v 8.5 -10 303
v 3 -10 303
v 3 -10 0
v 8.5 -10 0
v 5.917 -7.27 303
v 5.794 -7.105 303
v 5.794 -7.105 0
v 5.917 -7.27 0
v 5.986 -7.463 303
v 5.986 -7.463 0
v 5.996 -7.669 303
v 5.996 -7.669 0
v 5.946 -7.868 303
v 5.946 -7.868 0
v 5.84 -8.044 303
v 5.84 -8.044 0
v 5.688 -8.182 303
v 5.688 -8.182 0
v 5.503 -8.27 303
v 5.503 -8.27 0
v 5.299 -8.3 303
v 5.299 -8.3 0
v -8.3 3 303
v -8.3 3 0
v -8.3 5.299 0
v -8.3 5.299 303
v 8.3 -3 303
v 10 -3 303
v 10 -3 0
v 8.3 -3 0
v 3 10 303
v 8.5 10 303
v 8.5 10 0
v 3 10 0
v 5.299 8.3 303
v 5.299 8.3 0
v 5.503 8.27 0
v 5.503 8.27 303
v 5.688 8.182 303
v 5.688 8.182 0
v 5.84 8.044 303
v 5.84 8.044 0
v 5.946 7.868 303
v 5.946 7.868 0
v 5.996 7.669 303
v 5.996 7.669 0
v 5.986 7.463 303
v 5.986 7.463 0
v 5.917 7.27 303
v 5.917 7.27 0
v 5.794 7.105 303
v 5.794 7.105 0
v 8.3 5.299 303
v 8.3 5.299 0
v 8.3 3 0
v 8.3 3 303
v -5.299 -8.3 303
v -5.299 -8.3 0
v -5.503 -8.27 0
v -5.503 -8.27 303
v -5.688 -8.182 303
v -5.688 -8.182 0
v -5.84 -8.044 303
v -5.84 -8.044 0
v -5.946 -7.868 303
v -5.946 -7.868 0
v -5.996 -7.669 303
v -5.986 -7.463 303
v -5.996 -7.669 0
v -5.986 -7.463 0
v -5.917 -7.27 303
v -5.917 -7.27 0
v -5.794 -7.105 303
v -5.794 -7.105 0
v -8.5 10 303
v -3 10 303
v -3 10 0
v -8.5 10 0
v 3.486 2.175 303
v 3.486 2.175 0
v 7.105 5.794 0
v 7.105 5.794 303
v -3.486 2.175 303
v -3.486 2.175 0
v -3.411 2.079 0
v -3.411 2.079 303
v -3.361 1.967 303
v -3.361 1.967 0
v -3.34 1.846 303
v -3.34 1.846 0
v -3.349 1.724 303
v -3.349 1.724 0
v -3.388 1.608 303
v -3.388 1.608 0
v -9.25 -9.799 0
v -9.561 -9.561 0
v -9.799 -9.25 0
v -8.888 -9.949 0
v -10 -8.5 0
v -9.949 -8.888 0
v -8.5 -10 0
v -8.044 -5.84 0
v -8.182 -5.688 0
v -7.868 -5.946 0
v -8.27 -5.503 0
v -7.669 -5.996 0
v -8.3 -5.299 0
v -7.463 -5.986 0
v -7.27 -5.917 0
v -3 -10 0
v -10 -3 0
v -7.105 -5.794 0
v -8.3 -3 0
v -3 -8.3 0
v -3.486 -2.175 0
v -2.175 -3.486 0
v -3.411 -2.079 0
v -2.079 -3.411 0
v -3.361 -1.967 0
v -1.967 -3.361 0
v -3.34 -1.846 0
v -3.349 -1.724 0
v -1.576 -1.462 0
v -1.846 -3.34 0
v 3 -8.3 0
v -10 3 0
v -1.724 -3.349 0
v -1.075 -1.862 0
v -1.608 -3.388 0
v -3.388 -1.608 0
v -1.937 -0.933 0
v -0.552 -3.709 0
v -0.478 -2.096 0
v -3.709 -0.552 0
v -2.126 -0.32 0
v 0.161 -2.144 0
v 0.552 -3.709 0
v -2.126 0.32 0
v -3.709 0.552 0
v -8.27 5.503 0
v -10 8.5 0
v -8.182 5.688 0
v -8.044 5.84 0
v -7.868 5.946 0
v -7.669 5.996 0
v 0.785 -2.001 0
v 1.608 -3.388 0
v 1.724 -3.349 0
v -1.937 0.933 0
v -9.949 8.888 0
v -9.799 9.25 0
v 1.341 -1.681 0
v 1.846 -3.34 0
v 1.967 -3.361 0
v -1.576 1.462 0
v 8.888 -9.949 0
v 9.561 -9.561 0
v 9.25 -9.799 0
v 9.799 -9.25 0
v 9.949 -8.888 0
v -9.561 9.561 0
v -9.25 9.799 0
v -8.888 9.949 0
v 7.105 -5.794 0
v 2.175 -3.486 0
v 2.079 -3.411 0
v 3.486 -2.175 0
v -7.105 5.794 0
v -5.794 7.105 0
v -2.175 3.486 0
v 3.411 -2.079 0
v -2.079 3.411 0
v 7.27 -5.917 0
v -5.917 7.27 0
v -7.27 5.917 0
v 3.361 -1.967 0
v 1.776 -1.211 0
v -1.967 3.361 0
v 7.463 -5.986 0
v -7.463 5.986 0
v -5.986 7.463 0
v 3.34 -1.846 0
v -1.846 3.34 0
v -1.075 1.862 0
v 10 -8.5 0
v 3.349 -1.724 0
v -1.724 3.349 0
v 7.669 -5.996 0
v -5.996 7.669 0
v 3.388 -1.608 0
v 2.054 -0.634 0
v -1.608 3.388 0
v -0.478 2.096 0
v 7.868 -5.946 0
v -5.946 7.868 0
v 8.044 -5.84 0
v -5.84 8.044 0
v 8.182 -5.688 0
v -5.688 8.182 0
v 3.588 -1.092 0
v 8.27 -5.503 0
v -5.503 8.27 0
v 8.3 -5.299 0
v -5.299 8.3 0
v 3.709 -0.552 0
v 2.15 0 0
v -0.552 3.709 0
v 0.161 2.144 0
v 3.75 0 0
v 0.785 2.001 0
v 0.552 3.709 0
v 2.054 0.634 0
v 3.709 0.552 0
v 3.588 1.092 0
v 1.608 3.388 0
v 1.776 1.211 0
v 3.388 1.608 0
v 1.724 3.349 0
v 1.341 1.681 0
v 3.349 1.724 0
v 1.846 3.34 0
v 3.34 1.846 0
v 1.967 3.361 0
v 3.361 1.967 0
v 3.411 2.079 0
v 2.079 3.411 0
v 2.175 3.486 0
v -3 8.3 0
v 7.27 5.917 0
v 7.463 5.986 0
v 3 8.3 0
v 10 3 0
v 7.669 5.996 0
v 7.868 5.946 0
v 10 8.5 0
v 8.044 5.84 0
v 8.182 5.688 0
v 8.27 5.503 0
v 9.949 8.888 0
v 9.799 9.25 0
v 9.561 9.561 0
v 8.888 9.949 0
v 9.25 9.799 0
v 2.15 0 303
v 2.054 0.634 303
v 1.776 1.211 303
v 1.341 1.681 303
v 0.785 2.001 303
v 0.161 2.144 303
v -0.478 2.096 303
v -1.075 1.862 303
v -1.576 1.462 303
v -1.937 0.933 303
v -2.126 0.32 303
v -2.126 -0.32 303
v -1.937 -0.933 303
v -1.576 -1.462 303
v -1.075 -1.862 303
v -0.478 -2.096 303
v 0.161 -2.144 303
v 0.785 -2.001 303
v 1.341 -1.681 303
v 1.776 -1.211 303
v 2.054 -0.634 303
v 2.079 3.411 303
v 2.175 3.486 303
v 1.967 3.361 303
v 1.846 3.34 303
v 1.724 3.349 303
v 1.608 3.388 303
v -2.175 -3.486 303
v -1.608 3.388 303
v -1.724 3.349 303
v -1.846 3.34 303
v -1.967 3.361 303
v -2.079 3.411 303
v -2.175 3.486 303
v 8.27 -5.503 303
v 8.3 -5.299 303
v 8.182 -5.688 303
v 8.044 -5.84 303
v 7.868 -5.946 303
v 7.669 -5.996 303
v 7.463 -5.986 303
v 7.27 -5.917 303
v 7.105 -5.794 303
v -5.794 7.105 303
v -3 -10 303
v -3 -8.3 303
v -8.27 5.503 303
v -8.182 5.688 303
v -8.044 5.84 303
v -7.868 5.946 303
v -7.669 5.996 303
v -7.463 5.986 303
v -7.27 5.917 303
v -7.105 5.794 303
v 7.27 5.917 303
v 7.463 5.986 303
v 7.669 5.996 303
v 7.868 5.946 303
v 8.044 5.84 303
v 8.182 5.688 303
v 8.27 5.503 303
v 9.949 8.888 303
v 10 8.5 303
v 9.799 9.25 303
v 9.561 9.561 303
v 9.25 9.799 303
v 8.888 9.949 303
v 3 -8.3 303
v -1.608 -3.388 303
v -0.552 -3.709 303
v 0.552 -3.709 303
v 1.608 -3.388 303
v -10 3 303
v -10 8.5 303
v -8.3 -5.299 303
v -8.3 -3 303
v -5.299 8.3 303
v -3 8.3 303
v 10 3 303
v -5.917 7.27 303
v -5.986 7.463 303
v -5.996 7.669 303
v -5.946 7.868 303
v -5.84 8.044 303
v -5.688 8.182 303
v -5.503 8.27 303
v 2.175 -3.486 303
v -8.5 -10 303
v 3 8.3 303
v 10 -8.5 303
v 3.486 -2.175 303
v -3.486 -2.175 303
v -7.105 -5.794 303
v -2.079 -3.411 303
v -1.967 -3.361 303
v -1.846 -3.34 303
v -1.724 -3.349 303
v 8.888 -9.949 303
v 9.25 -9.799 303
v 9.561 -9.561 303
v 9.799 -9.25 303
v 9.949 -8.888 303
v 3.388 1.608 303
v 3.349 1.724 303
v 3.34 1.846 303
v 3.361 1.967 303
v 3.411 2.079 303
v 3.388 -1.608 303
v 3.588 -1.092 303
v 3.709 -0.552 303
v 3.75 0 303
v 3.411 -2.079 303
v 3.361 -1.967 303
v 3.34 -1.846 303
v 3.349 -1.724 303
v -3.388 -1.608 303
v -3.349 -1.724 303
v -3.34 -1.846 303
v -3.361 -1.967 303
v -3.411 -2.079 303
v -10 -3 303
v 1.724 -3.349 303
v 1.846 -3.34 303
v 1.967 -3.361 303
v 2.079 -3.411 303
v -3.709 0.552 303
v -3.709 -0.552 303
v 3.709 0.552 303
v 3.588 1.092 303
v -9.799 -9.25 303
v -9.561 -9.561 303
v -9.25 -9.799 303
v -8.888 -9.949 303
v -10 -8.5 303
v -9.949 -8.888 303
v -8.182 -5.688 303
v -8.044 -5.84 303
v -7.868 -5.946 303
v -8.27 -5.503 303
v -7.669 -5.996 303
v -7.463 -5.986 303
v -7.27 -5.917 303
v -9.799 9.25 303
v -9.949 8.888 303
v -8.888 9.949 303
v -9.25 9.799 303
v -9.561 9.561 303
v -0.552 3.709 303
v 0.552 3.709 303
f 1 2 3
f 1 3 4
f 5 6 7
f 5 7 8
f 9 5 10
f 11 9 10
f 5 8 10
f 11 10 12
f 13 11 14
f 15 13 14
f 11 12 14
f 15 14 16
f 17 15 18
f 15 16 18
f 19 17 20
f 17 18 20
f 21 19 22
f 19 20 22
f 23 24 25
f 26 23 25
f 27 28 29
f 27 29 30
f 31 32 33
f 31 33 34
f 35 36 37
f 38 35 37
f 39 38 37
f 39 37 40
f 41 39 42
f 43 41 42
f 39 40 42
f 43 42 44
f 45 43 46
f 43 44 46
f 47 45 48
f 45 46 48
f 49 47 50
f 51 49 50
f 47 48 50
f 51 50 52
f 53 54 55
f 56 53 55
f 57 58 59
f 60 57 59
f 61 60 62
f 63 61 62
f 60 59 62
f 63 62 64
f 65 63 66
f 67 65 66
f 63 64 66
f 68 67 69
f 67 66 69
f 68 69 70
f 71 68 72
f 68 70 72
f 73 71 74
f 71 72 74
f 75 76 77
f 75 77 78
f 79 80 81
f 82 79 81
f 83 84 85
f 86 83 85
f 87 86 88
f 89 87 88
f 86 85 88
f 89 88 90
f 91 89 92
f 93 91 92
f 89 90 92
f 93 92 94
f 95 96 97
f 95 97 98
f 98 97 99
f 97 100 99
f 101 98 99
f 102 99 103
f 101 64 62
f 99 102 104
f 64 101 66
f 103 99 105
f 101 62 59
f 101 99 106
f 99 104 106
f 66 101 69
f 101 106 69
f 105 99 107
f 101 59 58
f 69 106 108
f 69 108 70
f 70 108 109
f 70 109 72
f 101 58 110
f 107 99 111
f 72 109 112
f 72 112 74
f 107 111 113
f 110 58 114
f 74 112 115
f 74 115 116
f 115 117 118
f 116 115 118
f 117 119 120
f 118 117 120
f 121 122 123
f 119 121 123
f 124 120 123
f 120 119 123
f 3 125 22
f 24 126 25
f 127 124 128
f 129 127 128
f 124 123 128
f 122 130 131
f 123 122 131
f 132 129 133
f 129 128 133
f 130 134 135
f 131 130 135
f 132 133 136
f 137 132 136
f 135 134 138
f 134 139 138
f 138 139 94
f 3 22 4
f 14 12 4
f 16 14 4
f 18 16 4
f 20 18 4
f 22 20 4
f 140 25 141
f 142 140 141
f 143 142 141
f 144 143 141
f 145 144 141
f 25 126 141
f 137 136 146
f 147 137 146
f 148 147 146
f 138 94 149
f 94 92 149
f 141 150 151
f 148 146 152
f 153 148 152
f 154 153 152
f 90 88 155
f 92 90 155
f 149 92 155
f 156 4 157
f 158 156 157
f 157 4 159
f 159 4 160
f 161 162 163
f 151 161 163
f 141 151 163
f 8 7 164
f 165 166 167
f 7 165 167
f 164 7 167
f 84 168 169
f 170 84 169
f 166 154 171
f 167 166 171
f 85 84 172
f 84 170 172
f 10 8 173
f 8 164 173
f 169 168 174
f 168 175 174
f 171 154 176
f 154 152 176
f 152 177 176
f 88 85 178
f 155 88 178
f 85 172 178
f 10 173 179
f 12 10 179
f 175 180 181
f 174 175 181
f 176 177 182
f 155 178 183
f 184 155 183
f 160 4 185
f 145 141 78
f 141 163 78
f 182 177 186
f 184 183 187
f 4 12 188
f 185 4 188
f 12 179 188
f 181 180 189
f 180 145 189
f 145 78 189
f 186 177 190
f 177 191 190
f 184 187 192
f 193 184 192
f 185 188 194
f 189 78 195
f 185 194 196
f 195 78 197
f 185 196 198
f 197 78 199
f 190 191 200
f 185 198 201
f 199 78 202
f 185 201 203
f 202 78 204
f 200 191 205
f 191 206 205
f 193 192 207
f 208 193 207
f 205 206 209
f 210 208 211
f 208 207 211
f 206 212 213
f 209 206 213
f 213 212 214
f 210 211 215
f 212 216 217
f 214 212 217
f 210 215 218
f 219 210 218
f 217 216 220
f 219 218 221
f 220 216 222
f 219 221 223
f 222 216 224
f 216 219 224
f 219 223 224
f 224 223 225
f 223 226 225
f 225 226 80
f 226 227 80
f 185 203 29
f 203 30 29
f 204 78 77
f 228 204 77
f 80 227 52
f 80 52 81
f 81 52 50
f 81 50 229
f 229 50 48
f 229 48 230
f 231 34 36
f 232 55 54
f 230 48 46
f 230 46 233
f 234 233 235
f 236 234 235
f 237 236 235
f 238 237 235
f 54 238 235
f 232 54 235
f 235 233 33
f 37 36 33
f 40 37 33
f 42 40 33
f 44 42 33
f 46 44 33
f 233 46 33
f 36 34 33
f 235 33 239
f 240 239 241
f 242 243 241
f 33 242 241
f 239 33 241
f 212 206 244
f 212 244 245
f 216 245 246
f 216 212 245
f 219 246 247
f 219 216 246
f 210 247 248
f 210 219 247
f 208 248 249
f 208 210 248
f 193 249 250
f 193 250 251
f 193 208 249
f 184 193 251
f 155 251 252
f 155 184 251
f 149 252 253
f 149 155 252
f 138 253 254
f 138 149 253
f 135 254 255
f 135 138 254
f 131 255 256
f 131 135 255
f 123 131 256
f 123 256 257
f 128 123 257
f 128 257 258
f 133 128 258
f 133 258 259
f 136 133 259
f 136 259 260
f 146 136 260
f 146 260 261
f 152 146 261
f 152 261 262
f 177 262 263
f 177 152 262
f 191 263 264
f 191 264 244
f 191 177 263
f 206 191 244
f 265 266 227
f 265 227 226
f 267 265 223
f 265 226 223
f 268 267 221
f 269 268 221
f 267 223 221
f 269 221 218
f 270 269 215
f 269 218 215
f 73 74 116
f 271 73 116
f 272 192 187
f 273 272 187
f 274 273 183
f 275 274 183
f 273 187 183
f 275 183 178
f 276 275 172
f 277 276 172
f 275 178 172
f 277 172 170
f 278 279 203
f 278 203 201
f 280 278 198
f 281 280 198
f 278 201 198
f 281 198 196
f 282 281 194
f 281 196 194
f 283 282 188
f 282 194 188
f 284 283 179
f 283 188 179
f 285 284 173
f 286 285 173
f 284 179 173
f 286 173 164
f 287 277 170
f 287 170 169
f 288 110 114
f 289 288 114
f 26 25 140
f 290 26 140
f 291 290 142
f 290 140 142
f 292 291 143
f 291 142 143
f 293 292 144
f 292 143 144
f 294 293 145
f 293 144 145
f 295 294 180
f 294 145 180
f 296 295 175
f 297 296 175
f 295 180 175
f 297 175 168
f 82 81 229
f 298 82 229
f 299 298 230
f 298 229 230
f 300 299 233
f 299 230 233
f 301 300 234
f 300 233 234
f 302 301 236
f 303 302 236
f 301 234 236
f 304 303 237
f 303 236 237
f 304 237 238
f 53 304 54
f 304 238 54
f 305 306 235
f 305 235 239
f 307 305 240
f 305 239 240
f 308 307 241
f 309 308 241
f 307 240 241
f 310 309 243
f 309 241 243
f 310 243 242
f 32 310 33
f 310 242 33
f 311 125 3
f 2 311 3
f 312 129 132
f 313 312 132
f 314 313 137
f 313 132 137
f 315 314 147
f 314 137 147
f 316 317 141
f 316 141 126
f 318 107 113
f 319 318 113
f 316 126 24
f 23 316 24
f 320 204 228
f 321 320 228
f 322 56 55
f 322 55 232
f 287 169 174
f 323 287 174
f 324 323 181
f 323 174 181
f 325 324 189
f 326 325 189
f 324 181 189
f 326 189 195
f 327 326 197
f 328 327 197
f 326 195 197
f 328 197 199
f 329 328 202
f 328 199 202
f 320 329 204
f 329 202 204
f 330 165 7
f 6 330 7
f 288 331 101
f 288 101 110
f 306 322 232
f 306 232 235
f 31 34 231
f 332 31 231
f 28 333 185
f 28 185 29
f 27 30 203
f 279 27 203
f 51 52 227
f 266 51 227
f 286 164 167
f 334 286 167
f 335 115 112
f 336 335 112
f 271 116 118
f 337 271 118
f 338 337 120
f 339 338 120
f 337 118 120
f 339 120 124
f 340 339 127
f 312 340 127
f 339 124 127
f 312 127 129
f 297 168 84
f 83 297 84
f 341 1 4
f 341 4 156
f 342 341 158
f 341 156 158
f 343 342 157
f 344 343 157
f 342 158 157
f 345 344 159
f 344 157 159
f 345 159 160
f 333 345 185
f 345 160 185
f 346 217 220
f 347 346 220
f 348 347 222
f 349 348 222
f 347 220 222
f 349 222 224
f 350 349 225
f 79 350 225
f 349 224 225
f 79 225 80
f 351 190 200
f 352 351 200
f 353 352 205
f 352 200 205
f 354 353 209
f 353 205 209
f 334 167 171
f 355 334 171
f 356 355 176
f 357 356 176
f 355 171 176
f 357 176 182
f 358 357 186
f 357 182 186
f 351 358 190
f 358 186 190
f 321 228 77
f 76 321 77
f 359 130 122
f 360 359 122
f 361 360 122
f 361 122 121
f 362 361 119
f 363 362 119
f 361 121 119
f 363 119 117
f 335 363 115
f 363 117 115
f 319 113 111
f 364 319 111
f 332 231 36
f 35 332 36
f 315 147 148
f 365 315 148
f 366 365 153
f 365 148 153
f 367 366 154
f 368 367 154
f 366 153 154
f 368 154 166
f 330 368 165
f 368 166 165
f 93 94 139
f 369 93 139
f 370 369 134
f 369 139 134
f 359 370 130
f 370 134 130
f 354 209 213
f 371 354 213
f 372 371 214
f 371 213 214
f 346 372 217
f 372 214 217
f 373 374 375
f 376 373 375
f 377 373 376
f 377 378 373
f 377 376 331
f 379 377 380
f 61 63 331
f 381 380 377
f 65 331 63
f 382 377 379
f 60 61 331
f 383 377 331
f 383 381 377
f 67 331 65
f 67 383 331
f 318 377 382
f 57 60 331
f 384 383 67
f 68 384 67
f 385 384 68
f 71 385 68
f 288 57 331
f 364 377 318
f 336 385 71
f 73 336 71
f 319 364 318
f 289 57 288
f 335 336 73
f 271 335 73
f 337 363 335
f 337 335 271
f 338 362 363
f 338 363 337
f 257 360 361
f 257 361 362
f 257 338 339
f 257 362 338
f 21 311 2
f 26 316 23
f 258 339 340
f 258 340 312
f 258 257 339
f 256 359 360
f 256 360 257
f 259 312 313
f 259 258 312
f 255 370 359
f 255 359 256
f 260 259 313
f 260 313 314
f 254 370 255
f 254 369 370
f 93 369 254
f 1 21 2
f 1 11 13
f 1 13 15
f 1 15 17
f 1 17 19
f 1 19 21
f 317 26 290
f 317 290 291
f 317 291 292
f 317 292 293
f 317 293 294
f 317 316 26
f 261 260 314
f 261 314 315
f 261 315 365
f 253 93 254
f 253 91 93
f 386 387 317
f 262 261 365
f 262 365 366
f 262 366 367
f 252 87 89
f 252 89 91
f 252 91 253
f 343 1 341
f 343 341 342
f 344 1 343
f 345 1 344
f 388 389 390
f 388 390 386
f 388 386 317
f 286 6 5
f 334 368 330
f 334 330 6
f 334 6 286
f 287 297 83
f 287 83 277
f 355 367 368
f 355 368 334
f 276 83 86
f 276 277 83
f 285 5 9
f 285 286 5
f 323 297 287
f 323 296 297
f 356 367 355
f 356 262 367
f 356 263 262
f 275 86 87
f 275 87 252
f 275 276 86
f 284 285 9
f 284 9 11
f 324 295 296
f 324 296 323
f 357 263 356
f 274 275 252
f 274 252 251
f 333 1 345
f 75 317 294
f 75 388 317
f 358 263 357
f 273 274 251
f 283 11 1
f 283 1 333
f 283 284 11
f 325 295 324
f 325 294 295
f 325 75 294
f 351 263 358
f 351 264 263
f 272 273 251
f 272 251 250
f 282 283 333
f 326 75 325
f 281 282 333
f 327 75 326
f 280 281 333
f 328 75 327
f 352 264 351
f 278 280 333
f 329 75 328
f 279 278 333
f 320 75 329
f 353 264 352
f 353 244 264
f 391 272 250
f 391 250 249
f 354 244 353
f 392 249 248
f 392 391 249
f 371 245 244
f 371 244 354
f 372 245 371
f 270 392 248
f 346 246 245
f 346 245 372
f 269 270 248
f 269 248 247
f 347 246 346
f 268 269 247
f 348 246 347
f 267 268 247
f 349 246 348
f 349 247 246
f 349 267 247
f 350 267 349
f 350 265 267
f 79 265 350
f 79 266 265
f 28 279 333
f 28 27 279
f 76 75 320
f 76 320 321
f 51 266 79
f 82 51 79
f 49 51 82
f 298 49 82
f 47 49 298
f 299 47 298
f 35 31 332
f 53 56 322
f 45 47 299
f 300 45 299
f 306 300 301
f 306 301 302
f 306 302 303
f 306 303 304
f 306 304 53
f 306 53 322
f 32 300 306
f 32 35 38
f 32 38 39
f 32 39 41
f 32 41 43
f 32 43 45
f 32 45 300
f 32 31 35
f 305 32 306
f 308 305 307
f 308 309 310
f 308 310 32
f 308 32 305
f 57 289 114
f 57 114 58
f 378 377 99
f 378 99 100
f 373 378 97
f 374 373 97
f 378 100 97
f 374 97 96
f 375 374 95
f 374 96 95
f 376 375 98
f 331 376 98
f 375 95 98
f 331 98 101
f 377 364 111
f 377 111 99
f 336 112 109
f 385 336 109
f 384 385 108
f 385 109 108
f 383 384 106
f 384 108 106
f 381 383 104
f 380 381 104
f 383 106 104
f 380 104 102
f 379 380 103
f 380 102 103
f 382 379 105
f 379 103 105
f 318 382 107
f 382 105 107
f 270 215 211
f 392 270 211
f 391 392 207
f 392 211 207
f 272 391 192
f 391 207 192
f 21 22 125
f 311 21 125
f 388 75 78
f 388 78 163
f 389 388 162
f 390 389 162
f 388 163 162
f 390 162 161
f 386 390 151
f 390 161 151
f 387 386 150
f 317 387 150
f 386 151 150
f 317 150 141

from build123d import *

# Parameters (mm, degrees)
ESQUISSE1_R        = 2.15
BOSS_EXTRU_1_DEPTH = 303


with BuildPart() as part:
    # Esquisse1 → Boss.-Extru.1 (new body)
    with BuildSketch(Plane.XY):
        with BuildLine():
            Line((-3, 10), (-8.5, 10))
            ThreePointArc((-8.5, 10), (-9.560660172, 9.560660172), (-10, 8.5))
            Line((-10, 8.5), (-10, 3))
            Line((-10, 3), (-8.300000103, 3))
            Line((-8.300000103, 3), (-8.300000103, 5.299391013))
            ThreePointArc((-8.300000103, 5.299391013), (-7.867878523, 5.946106661), (-7.105025403, 5.794365741))
            Line((-7.105025403, 5.794365741), (-3.486125569, 2.175465907))
            ThreePointArc((-3.486125569, 2.175465907), (-3.346986783, 1.907085393), (-3.38795202, 1.607569866))
            ThreePointArc((-3.38795202, 1.607569866), (-3.749999968, 1.37e-07), (-3.387952137, -1.607569618))
            ThreePointArc((-3.387952137, -1.607569618), (-3.346986918, -1.907085124), (-3.486125693, -2.175465617))
            Line((-3.486125693, -2.175465617), (-7.10502539, -5.794365497))
            ThreePointArc((-7.10502539, -5.794365497), (-7.867878514, -5.946106433), (-8.300000103, -5.299390782))
            Line((-8.300000103, -5.299390782), (-8.300000103, -3))
            Line((-8.300000103, -3), (-10, -3))
            Line((-10, -3), (-10, -8.5))
            ThreePointArc((-10, -8.5), (-9.560660172, -9.560660172), (-8.5, -10))
            Line((-8.5, -10), (-3, -10))
            Line((-3, -10), (-3, -8.29999992))
            Line((-3, -8.29999992), (-5.299390173, -8.29999992))
            ThreePointArc((-5.299390173, -8.29999992), (-5.94610582, -7.867878342), (-5.794364905, -7.105025224))
            Line((-5.794364905, -7.105025224), (-2.175465502, -3.486125765))
            ThreePointArc((-2.175465502, -3.486125765), (-1.907085014, -3.346986981), (-1.607569506, -3.38795219))
            ThreePointArc((-1.607569506, -3.38795219), (1.99e-07, -3.749999968), (1.607569866, -3.38795202))
            ThreePointArc((1.607569866, -3.38795202), (1.907085393, -3.346986783), (2.175465907, -3.486125569))
            Line((2.175465907, -3.486125569), (5.794365558, -7.10502522))
            ThreePointArc((5.794365558, -7.10502522), (5.946106478, -7.86787834), (5.29939083, -8.29999992))
            Line((5.29939083, -8.29999992), (3, -8.29999992))
            Line((3, -8.29999992), (3, -10))
            Line((3, -10), (8.499999896, -10))
            ThreePointArc((8.499999896, -10), (9.560660068, -9.560660172), (9.999999896, -8.5))
            Line((9.999999896, -8.5), (9.999999896, -3))
            Line((9.999999896, -3), (8.300000103, -3))
            Line((8.300000103, -3), (8.300000103, -5.299391569))
            ThreePointArc((8.300000103, -5.299391569), (7.867878509, -5.946107222), (7.105025381, -5.794366275))
            Line((7.105025381, -5.794366275), (3.486125475, -2.175466057))
            ThreePointArc((3.486125475, -2.175466057), (3.346986701, -1.907085538), (3.38795195, -1.607570012))
            ThreePointArc((3.38795195, -1.607570012), (3.658368452, -0.823917488), (3.749999968, 0))
            ThreePointArc((3.749999968, 0), (3.658368507, 0.823917244), (3.387952165, 1.607569559))
            ThreePointArc((3.387952165, 1.607569559), (3.346986951, 1.907085066), (3.486125731, 2.175465556))
            Line((3.486125731, 2.175465556), (7.105025399, 5.79436528))
            ThreePointArc((7.105025399, 5.79436528), (7.86787852, 5.946106205), (8.300000103, 5.299390557))
            Line((8.300000103, 5.299390557), (8.300000103, 3))
            Line((8.300000103, 3), (9.999999896, 3))
            Line((9.999999896, 3), (9.999999896, 8.5))
            ThreePointArc((9.999999896, 8.5), (9.560660068, 9.560660172), (8.499999896, 10))
            Line((8.499999896, 10), (3.499999896, 10))
            Line((3.499999896, 10), (3, 10))
            Line((3, 10), (3, 8.29999992))
            Line((3, 8.29999992), (5.299389948, 8.29999992))
            ThreePointArc((5.299389948, 8.29999992), (5.946105592, 7.867878348), (5.794364688, 7.105025232))
            Line((5.794364688, 7.105025232), (2.175465441, 3.486125803))
            ThreePointArc((2.175465441, 3.486125803), (1.907084956, 3.346987014), (1.607569447, 3.387952218))
            ThreePointArc((1.607569447, 3.387952218), (-1.51e-07, 3.749999968), (-1.60756972, 3.387952089))
            ThreePointArc((-1.60756972, 3.387952089), (-1.907085249, 3.346986865), (-2.175465757, 3.486125663))
            Line((-2.175465757, 3.486125663), (-5.794365024, 7.105025241))
            ThreePointArc((-5.794365024, 7.105025241), (-5.946105917, 7.867878353), (-5.299390275, 8.29999992))
            Line((-5.299390275, 8.29999992), (-3, 8.29999992))
            Line((-3, 8.29999992), (-3, 10))
        make_face()
        Circle(ESQUISSE1_R, mode=Mode.SUBTRACT)
    extrude(amount=BOSS_EXTRU_1_DEPTH)


solid = part.part
